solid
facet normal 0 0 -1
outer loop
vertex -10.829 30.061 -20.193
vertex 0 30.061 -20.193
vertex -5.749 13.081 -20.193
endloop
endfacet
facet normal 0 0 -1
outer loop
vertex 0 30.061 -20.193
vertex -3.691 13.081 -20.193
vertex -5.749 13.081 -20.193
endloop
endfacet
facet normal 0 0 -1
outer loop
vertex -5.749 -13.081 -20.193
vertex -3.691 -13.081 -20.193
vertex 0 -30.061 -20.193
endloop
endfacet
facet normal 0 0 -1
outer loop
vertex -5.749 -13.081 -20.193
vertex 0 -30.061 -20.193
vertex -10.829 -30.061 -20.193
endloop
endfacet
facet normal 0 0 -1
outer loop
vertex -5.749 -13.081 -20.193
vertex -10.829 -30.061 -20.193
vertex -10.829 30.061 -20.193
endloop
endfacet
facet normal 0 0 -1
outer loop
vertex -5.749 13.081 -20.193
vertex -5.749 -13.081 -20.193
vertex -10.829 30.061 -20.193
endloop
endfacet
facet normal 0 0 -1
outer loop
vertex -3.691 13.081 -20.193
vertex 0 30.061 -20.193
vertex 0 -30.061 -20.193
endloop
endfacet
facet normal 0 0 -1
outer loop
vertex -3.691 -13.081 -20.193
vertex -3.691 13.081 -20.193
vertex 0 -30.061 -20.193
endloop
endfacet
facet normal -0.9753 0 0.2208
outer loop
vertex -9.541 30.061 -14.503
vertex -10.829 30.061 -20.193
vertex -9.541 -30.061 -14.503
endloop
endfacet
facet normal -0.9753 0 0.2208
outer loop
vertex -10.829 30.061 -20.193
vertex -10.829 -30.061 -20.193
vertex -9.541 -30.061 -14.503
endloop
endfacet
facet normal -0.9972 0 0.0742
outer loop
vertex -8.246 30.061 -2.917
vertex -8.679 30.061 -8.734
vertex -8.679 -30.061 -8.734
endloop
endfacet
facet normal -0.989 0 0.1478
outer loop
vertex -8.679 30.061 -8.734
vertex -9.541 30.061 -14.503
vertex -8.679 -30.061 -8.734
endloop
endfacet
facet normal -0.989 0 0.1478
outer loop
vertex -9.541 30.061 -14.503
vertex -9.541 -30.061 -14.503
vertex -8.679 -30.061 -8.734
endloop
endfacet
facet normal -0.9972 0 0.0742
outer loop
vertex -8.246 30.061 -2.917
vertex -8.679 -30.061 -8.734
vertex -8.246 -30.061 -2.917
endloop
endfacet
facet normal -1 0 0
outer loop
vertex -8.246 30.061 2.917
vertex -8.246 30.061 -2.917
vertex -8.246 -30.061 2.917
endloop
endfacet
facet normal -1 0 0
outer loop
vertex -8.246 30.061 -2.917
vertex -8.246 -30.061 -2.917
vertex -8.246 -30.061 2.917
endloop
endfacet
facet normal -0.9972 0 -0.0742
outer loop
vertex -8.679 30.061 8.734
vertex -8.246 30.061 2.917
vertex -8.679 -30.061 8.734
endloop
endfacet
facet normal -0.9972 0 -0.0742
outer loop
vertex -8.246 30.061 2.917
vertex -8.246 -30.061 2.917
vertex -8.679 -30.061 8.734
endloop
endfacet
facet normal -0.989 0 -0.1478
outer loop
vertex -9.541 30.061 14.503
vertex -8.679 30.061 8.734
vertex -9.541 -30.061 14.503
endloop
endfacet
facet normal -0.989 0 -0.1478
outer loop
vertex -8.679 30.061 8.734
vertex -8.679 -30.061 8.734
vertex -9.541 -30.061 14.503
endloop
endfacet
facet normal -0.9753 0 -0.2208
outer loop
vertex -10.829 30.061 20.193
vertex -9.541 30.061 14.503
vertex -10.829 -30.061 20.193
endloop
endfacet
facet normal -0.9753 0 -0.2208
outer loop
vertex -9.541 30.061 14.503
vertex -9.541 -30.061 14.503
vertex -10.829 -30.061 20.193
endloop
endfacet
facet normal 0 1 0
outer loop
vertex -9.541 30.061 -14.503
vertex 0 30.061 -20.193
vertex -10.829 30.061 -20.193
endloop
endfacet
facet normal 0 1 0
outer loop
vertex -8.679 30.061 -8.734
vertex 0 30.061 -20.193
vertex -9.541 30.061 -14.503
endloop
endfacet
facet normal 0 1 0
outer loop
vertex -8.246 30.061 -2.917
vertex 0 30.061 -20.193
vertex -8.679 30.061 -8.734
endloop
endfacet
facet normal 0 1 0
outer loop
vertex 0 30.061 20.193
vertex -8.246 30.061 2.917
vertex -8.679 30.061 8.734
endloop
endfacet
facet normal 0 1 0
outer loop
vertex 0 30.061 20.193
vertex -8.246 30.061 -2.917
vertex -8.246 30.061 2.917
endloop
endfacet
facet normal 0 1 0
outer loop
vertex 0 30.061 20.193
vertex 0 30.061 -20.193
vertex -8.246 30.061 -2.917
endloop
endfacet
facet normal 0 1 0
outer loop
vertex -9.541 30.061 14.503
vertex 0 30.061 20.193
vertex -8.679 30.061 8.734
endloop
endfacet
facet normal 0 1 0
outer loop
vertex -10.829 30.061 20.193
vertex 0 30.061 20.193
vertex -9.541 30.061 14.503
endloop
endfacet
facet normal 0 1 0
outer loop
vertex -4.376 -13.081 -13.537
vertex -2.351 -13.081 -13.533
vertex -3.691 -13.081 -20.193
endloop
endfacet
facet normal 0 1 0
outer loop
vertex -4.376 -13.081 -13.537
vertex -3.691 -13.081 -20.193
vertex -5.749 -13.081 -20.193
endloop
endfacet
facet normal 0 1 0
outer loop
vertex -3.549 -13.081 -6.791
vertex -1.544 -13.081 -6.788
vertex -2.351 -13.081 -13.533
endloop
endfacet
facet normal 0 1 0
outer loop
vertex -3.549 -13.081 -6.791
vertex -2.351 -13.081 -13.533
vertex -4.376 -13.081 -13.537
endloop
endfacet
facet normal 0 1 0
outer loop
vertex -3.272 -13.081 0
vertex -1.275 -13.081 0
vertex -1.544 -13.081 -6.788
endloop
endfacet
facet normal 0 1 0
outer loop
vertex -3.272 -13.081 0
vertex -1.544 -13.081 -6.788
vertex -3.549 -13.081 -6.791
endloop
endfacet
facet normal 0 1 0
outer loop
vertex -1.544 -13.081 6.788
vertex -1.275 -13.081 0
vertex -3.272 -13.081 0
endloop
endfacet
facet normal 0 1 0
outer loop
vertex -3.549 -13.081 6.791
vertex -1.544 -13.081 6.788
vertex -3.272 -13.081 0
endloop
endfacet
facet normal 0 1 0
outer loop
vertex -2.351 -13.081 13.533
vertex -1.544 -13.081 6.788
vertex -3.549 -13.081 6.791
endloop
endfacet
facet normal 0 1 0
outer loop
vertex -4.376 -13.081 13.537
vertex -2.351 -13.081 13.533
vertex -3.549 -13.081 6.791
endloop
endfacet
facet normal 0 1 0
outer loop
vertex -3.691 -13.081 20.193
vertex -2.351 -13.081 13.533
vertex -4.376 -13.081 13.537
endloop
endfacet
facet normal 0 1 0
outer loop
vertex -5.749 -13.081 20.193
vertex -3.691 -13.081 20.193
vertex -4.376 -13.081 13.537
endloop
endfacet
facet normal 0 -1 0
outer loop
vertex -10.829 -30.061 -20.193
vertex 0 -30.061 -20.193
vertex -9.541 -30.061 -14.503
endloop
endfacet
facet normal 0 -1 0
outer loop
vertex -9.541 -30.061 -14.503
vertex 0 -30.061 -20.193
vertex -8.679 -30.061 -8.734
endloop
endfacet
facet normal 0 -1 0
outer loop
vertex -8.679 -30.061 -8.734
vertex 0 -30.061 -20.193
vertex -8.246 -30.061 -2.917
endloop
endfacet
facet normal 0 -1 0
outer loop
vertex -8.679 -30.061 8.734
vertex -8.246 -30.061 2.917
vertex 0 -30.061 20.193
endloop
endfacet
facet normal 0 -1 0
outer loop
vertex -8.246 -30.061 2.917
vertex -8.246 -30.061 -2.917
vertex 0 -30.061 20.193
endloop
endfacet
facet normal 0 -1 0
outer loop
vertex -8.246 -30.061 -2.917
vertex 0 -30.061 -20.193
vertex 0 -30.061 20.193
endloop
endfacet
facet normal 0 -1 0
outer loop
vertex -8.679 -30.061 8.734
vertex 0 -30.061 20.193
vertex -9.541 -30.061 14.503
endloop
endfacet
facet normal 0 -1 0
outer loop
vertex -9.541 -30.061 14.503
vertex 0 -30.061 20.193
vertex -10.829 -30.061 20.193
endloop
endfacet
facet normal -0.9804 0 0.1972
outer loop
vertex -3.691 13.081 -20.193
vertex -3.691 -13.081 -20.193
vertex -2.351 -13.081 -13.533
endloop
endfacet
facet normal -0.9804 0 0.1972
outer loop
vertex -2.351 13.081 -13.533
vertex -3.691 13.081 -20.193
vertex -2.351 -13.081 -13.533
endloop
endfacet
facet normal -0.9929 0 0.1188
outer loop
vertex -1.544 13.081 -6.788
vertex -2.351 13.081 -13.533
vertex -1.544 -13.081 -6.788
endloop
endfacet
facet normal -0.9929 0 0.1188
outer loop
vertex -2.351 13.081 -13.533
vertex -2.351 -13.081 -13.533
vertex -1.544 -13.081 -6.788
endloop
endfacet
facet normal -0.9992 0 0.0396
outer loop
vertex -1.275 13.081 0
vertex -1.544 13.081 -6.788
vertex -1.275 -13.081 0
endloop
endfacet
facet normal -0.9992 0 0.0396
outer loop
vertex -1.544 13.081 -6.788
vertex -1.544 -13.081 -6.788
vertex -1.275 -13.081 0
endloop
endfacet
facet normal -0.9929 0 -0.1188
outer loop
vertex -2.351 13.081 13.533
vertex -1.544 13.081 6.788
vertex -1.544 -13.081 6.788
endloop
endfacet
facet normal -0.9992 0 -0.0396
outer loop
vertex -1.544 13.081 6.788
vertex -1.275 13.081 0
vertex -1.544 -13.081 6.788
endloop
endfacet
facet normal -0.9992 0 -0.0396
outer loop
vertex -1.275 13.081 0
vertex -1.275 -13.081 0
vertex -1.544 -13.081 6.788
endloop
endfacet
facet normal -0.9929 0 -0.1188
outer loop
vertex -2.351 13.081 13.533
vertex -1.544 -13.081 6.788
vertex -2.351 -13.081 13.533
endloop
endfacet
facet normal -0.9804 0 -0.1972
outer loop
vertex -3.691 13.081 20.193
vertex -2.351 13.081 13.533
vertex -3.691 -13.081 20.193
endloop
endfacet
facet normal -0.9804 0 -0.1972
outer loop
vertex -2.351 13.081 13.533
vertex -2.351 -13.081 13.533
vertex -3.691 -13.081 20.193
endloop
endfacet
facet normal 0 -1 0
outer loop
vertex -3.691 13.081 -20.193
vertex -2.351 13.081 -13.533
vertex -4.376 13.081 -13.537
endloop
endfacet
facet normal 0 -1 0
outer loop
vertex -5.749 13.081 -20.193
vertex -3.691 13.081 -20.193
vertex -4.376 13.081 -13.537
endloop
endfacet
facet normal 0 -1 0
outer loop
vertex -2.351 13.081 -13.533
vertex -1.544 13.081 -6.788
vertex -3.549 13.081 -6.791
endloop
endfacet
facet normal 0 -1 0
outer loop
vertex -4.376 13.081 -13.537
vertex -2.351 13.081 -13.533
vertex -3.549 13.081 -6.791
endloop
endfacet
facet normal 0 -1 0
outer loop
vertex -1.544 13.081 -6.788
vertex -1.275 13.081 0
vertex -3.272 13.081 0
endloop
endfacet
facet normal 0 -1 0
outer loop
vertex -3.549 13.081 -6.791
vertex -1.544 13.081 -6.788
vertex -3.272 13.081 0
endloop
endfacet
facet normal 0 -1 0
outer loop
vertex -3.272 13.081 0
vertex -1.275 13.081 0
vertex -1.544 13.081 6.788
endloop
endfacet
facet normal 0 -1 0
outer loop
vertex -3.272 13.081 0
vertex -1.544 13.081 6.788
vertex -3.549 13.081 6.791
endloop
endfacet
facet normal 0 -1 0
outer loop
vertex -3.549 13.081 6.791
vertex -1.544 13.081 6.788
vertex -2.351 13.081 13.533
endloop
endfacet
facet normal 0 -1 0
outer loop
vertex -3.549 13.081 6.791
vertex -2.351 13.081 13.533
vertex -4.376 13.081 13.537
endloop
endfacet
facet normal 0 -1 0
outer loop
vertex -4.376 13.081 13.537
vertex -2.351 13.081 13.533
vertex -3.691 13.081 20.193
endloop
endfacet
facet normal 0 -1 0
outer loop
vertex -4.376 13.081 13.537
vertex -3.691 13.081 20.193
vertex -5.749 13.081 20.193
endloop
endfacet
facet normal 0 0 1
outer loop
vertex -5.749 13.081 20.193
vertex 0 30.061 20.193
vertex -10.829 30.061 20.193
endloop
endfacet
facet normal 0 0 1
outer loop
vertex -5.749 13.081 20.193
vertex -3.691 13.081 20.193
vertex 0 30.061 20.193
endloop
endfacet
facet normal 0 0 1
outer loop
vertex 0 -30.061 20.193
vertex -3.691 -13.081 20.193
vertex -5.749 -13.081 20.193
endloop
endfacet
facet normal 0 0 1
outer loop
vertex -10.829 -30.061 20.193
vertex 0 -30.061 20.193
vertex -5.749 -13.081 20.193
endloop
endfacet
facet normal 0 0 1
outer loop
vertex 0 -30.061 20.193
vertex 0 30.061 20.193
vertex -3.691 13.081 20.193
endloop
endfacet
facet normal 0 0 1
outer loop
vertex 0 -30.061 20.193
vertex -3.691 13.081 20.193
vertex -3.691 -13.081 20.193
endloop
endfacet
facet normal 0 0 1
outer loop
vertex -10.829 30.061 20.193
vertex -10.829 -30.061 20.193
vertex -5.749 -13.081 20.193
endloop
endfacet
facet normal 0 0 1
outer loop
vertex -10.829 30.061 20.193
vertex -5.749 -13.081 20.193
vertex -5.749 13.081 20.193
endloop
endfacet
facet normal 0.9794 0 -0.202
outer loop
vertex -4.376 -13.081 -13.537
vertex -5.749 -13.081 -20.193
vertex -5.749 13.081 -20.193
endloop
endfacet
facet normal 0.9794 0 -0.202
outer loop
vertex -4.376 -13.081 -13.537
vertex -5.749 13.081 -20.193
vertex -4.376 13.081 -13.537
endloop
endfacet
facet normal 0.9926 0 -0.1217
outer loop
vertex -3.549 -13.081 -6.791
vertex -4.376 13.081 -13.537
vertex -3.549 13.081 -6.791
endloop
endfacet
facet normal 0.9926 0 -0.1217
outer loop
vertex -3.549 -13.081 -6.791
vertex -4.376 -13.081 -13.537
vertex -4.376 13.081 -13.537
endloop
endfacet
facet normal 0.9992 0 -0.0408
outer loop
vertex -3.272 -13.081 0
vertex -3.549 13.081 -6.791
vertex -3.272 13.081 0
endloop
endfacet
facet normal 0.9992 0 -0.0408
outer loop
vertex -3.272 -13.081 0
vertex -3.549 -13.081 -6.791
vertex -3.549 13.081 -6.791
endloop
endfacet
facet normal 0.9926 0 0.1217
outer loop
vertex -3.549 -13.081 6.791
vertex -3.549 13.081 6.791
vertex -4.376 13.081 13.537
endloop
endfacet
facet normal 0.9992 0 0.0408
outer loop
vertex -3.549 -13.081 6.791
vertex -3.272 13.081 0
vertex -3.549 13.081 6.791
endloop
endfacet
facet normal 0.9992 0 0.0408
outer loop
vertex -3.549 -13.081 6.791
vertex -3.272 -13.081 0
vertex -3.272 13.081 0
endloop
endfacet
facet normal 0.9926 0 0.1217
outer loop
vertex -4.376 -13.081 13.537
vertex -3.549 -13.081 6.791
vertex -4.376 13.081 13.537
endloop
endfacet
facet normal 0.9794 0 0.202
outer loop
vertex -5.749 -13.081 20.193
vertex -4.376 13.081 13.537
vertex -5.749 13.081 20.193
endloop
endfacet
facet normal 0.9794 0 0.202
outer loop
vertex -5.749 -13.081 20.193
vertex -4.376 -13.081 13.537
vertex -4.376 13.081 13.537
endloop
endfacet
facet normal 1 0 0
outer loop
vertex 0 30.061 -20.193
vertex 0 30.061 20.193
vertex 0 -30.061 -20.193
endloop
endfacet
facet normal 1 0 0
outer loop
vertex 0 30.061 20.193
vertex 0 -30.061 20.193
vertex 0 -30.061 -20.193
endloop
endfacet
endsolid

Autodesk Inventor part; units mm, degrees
ref_plane "YZ Plane" through (0, 0, 0) normal (1, 0, 0) x (0, 1, 0)
ref_plane "XZ Plane" through (0, 0, 0) normal (0, 1, 0) x (-1, 0, 0)
ref_plane "XY Plane" through (0, 0, 0) normal (0, 0, 1) x (1, 0, 0)
sketch "Sketch1" plane through (0, 0, 0) normal (0, 1, 0) x (-1, 0, 0)
  line L0 (0, 20.193) -> (0, -20.193)
  line L1 (0, -20.193) -> (3.6912, -20.193)
  line L2 (0, 20.193) -> (3.6912, 20.193)
  arc A0 (10.8286, 20.193) -> (10.8286, -20.193) centre (86.8455, 0) ccw
  arc A1 (5.7486, 20.193) -> (5.7486, -20.193) centre (86.8455, 0) ccw
  arc A2 (3.6912, 20.193) -> (3.6912, -20.193) centre (86.8455, 0) ccw
  line L3 (5.7486, 20.193) -> (10.8286, 20.193)
  line L4 (3.6912, 20.193) -> (5.7486, 20.193)
  line L5 (3.6912, -20.193) -> (5.7486, -20.193)
  line L6 (5.7486, -20.193) -> (10.8286, -20.193)
  point P0 (0, 0)
  point P1 (8.1923, 0)
  point P2 (0, 0)
  dimension "d0" = 2.0574
  dimension "d1" = 5.08
  dimension "d2" = 8.1923
  dimension "d3" = 40.386
  dimension "d4" = 10.8286
extrude "Extrusion1" add sketch "Sketch1" along normal mid plane 60.1218
extrude "Extrusion2" cut sketch "Sketch1" along normal mid plane 26.162 contours L4 A1 L5 A2
equation "\"d2\" = LowerArch"
equation "\"d4\" = Height"
equation "\"Height\" = 10.828576"
equation "\"LowerArch\" = 8.192275"
properties part number "Cover" material "Glass"
